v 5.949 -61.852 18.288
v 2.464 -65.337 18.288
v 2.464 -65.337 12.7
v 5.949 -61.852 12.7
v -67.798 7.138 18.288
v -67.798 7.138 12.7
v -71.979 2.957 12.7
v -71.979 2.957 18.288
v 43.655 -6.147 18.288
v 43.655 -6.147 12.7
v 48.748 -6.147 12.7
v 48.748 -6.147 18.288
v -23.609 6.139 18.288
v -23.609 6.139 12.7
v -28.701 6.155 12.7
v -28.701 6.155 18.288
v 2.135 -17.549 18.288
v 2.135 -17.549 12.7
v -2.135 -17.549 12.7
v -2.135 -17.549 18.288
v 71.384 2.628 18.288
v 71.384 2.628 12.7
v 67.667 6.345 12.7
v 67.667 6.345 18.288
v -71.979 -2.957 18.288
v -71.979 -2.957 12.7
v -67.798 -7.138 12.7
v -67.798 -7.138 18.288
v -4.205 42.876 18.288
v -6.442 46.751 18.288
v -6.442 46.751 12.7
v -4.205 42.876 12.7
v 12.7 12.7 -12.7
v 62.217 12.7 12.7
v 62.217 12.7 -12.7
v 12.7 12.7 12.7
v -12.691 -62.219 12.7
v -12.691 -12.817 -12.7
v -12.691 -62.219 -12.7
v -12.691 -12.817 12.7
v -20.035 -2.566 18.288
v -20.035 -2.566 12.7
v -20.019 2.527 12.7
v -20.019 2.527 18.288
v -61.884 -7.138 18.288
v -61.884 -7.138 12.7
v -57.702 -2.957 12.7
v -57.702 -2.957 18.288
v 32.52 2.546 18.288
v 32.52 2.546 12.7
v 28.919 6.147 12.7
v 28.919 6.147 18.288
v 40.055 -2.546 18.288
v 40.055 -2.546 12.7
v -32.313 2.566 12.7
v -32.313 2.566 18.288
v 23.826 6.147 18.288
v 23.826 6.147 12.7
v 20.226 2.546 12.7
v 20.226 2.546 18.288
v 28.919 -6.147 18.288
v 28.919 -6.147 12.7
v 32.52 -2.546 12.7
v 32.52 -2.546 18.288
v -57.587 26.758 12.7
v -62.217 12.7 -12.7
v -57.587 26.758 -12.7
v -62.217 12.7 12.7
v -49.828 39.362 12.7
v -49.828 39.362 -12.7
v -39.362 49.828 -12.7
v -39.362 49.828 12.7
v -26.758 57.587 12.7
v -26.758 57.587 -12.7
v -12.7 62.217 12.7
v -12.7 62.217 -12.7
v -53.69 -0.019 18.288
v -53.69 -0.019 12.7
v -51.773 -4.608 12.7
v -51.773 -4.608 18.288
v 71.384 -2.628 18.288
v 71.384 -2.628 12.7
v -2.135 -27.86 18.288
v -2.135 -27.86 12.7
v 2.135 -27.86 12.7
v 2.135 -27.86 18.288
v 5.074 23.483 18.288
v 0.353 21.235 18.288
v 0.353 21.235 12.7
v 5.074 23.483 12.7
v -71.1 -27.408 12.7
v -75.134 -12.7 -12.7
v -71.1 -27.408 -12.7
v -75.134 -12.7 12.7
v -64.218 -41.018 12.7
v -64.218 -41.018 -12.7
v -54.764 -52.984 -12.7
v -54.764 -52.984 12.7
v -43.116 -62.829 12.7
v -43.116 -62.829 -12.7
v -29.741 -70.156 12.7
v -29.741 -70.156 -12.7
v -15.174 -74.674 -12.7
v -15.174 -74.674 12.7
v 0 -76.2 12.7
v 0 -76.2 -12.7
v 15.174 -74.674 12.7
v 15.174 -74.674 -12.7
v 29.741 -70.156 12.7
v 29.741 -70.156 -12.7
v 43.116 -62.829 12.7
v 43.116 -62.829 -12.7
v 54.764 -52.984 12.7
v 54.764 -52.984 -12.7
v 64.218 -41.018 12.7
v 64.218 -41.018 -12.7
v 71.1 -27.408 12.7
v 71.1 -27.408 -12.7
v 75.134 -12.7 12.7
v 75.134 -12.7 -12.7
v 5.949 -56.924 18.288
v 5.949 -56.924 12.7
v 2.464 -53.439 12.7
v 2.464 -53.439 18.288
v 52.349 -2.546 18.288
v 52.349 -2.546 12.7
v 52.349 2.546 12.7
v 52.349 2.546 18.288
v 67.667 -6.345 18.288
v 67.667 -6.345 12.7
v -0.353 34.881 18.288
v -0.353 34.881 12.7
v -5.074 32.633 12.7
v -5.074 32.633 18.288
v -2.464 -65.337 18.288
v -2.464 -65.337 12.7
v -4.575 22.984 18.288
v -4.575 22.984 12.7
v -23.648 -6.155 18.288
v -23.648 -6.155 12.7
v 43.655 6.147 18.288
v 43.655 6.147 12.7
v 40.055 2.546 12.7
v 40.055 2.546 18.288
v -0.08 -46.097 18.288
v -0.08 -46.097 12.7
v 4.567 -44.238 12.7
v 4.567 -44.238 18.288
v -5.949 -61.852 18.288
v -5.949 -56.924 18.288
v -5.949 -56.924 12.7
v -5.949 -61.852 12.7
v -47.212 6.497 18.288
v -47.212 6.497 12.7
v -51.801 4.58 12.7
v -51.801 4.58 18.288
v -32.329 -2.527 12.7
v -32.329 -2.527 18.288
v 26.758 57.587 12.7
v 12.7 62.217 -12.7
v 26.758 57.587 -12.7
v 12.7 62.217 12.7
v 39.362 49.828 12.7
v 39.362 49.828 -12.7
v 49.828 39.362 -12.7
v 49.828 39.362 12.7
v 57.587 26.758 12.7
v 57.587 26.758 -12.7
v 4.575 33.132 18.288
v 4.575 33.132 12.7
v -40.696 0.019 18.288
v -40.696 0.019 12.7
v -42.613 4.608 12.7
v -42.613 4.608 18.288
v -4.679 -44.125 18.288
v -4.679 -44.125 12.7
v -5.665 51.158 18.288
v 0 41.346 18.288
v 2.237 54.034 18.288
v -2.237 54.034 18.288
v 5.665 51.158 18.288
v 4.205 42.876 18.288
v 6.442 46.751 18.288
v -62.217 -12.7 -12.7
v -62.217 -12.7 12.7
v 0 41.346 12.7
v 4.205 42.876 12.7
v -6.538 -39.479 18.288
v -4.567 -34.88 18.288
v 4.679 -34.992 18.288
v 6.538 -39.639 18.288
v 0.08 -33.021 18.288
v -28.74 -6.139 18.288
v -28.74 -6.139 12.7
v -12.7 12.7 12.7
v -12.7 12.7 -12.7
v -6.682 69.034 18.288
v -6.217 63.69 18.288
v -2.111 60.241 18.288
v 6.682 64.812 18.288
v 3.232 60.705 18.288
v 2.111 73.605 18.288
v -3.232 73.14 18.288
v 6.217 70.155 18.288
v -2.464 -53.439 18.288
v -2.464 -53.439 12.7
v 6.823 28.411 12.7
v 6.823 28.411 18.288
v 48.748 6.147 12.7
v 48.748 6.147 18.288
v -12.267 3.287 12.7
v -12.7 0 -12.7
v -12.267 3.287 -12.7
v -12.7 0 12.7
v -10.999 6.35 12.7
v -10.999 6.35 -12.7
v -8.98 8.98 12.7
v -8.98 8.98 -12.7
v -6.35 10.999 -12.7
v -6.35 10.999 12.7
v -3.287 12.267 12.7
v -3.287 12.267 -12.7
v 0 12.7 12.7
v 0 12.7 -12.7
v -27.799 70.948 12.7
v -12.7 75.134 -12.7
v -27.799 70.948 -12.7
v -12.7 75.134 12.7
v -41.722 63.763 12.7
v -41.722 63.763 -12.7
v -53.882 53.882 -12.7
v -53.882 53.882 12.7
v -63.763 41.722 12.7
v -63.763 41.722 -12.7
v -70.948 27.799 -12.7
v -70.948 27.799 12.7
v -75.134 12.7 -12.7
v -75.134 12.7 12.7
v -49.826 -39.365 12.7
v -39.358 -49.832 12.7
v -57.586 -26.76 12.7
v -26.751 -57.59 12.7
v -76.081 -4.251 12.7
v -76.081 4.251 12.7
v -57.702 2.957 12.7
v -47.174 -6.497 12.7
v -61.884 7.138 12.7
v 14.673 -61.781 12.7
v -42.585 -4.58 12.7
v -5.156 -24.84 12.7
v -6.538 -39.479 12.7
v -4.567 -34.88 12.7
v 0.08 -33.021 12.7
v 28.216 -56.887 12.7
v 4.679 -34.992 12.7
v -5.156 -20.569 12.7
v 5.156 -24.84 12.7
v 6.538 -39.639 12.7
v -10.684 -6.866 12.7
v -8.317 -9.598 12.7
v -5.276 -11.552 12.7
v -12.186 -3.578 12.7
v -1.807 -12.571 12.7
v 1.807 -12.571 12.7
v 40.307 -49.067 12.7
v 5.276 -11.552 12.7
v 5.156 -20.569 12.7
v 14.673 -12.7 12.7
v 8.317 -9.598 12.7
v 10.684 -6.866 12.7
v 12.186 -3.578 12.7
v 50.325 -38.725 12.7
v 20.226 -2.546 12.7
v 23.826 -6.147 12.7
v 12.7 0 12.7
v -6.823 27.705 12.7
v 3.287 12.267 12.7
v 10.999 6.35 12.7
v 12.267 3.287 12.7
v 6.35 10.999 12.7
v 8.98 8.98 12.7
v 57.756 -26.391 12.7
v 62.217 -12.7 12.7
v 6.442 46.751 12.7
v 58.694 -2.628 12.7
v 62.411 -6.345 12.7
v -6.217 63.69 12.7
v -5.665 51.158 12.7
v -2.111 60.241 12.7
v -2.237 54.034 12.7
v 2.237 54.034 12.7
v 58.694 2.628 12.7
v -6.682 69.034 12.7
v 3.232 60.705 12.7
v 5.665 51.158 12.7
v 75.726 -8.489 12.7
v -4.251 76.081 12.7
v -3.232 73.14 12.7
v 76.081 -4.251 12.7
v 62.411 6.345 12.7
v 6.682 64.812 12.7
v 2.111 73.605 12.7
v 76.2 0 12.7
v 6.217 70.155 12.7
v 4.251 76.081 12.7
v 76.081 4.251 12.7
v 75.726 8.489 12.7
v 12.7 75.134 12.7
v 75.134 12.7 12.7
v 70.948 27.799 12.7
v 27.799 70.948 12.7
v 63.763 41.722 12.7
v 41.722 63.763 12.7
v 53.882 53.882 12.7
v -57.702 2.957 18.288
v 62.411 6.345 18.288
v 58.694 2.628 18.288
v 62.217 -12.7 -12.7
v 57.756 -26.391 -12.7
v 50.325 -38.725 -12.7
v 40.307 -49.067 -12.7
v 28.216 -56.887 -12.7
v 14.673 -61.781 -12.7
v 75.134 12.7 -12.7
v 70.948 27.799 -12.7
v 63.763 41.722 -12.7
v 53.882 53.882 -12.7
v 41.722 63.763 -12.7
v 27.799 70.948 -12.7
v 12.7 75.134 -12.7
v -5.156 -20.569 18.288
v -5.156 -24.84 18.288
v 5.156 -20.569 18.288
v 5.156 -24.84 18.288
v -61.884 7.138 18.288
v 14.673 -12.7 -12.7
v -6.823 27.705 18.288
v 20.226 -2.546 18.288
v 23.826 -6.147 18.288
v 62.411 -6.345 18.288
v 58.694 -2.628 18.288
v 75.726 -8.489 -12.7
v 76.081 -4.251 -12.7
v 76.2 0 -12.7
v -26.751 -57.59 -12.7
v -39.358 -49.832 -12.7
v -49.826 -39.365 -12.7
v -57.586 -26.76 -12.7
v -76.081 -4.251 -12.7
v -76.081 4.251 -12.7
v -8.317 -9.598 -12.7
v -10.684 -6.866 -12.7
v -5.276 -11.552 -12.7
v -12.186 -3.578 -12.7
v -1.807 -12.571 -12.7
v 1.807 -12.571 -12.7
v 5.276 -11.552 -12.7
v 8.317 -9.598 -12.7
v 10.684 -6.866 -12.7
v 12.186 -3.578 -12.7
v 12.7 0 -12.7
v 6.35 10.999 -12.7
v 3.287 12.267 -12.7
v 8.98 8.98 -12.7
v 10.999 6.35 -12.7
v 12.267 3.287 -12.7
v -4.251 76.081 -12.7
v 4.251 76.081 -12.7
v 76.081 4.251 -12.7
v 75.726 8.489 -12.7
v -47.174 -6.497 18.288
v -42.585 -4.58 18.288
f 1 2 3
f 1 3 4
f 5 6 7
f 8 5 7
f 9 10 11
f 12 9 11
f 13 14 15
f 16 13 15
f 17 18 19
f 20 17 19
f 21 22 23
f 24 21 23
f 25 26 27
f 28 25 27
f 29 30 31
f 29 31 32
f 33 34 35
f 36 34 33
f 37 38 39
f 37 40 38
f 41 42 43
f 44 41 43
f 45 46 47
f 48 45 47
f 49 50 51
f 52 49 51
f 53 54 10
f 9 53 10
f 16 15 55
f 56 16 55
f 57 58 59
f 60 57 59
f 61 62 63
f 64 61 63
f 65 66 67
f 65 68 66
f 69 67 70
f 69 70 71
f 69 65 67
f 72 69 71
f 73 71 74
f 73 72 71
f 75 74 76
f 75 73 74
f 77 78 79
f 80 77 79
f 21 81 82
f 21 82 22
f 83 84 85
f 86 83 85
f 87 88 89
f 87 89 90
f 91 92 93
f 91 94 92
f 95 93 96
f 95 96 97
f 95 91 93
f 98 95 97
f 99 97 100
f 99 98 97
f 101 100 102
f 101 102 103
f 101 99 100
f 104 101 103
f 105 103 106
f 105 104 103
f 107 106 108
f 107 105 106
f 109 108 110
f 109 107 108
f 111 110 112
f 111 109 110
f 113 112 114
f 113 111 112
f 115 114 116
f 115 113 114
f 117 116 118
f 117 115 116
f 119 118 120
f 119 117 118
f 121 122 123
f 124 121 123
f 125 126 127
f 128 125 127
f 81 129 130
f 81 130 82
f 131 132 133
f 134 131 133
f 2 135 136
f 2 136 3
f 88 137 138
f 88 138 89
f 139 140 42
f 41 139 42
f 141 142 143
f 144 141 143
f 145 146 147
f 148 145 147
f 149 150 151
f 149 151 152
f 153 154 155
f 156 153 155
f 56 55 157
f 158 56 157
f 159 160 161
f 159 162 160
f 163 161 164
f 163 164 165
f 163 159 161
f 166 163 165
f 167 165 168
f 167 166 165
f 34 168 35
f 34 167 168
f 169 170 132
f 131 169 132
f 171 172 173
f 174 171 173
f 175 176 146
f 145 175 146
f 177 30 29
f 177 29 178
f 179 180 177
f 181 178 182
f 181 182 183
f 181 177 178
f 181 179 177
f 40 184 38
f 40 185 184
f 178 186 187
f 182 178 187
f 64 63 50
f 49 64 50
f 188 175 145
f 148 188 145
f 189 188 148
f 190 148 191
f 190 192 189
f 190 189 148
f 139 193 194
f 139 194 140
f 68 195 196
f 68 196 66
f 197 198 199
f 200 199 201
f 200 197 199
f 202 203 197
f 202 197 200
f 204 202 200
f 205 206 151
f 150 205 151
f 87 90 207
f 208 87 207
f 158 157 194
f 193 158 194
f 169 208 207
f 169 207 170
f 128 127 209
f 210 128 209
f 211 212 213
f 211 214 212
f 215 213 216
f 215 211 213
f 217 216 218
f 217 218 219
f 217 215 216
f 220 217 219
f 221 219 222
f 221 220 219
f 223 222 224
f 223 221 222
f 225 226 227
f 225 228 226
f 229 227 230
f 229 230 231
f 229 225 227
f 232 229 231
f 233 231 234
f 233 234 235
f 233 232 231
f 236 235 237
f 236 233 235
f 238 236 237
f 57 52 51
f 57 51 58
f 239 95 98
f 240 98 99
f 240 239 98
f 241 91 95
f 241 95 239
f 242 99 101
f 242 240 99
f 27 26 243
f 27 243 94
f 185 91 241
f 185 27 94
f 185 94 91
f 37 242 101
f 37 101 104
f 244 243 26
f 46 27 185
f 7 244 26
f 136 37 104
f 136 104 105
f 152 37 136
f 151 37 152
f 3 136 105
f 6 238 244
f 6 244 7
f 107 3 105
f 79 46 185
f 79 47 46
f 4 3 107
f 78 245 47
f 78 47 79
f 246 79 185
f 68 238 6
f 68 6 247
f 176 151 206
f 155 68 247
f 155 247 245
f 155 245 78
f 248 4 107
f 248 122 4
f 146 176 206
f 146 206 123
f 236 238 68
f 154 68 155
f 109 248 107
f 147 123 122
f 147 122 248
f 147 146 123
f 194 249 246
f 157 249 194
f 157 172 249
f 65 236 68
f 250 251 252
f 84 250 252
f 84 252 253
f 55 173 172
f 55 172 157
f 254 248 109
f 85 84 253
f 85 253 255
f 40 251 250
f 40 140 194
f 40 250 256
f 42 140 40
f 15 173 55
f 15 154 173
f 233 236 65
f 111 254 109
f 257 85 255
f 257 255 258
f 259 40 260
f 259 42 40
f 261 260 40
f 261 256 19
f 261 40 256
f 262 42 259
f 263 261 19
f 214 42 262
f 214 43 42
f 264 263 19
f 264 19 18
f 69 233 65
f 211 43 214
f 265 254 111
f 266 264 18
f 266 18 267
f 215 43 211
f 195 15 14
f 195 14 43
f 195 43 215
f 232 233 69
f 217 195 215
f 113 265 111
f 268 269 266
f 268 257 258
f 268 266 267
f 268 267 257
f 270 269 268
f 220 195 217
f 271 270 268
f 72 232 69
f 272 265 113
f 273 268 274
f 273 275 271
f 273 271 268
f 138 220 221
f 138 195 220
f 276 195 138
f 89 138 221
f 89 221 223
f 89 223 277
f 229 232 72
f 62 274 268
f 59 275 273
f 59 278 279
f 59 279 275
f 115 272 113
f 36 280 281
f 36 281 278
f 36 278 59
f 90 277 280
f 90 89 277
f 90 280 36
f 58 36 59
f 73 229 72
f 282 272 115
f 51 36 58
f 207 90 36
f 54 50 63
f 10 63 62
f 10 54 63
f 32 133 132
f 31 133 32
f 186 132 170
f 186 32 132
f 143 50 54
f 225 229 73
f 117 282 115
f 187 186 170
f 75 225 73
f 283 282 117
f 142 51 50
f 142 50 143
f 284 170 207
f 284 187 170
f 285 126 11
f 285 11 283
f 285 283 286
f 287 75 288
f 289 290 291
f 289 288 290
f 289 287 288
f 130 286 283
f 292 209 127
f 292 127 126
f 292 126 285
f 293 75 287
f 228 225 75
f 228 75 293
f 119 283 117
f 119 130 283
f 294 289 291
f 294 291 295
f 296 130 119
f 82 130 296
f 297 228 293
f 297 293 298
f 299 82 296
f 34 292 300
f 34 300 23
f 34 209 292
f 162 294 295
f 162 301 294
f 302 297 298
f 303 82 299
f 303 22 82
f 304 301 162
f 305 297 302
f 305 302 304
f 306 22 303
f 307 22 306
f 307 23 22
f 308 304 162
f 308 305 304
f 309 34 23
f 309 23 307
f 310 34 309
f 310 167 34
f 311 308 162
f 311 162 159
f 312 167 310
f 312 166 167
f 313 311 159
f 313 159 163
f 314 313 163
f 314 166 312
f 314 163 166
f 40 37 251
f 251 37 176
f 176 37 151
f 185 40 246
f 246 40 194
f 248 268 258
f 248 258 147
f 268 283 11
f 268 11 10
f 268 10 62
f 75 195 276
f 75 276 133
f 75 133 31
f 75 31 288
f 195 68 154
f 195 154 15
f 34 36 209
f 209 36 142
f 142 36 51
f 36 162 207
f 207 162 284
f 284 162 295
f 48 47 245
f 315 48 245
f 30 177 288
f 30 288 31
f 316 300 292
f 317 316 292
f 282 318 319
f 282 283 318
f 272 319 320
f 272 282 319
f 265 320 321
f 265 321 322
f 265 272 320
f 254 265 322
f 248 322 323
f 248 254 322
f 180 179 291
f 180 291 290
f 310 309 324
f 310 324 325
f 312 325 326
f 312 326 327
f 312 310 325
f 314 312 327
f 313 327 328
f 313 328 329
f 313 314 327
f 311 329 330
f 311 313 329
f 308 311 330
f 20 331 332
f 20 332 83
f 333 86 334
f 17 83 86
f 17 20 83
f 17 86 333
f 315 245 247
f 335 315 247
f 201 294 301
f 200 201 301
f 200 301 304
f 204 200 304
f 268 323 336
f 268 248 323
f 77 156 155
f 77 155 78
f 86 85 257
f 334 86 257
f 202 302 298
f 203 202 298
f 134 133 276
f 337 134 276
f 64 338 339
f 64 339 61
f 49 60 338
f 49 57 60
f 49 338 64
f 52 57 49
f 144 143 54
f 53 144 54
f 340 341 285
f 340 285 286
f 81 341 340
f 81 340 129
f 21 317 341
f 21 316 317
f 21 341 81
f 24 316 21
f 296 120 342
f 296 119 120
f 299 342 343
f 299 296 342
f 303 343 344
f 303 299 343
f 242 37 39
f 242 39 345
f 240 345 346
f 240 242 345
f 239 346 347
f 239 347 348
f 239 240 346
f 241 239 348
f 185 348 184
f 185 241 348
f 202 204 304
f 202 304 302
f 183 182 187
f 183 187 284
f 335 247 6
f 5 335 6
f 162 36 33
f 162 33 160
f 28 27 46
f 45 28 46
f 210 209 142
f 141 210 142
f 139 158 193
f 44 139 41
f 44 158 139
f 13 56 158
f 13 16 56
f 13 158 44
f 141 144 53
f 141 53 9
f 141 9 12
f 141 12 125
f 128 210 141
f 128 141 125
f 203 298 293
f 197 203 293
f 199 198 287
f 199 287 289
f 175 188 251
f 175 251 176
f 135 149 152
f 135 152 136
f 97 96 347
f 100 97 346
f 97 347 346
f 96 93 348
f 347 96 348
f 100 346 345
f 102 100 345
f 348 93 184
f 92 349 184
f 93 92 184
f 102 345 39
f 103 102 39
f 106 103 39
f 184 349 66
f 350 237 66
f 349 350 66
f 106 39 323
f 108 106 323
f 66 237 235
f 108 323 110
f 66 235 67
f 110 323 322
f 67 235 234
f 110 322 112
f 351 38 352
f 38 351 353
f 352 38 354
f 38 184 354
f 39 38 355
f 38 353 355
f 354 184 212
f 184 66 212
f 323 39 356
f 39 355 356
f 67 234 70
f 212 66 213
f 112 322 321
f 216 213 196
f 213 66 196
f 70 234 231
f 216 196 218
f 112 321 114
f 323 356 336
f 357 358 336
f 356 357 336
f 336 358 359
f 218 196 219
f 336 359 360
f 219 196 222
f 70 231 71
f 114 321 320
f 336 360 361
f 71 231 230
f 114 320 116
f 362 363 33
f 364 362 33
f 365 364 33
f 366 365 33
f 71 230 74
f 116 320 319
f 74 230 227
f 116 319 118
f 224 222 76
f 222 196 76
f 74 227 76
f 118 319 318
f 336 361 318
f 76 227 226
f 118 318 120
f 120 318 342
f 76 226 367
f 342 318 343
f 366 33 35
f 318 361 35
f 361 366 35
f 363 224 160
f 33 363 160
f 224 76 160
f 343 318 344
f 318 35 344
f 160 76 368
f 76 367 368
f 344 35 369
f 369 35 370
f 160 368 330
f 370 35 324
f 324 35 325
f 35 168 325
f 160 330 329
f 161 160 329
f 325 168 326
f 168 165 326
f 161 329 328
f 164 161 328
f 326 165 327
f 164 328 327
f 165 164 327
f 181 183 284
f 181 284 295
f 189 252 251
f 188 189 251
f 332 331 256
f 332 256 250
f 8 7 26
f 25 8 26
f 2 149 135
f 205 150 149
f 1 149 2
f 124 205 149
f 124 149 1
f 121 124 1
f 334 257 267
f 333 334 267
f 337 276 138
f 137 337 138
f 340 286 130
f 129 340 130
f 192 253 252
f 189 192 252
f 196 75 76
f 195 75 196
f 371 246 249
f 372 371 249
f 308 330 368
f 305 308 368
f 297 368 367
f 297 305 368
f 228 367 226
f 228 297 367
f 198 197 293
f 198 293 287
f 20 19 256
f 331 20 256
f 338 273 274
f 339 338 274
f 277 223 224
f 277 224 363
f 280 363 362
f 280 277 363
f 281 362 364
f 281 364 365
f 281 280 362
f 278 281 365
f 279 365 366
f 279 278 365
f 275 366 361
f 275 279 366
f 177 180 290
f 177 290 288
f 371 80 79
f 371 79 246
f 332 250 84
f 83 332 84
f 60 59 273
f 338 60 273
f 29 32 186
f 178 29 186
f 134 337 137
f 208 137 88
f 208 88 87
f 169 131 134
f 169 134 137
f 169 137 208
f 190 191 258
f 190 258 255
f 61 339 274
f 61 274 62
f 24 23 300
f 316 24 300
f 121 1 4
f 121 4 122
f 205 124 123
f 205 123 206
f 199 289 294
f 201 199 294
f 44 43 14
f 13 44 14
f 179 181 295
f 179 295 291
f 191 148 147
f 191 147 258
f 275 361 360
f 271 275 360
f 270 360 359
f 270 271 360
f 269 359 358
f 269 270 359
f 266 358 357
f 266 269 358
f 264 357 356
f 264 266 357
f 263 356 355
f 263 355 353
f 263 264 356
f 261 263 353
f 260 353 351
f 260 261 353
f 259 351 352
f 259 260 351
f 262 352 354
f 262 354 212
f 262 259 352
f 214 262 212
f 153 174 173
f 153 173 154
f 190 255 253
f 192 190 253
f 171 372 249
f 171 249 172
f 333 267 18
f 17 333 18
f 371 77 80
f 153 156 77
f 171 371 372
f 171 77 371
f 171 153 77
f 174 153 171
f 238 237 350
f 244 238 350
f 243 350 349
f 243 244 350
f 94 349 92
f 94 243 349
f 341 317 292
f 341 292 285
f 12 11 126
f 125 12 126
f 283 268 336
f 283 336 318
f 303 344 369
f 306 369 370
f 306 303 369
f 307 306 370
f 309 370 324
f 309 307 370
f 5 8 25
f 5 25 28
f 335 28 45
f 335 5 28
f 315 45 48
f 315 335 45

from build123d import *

# Parameters (mm, degrees)
F1_DEPTH = 12.7
F3_DEPTH = 5.588


with BuildPart() as f1:
    # F0 (on Top) → F1 (new body, symmetric)
    with BuildSketch(Plane.XY):
        with BuildLine():
            ThreePointArc((75.134213, -12.7), (75.933086, -6.372321), (76.2, 0))
            ThreePointArc((76.2, 0), (75.933086, 6.372321), (75.134213, 12.7))
            ThreePointArc((75.134213, 12.7), (53.881537, 53.881537), (12.7, 75.134213))
            ThreePointArc((12.7, 75.134213), (0, 76.2), (-12.7, 75.134213))
            ThreePointArc((-12.7, 75.134213), (-53.881537, 53.881537), (-75.134213, 12.7))
            ThreePointArc((-75.134213, 12.7), (-76.2, 0), (-75.134213, -12.7))
            ThreePointArc((-75.134213, -12.7), (0, -76.2), (75.134213, -12.7))
        make_face()
        with BuildLine():
            ThreePointArc((-12.690558, -62.218966), (-44.897873, -44.904687), (-62.217039, -12.7))
            Line((-62.217039, -12.7), (-12.690558, -12.817428))
            Line((-12.690558, -12.817428), (-12.690558, -62.218966))
        make_face(mode=Mode.SUBTRACT)
        with BuildLine():
            Line((14.67346, -12.7), (62.217039, -12.7))
            ThreePointArc((62.217039, -12.7), (45.610118, -44.181073), (14.67346, -61.781385))
            Line((14.67346, -61.781385), (14.67346, -12.7))
        make_face(mode=Mode.SUBTRACT)
        with BuildLine():
            Line((-12.7, 12.7), (-62.217039, 12.7))
            ThreePointArc((-62.217039, 12.7), (-44.901281, 44.901281), (-12.7, 62.217039))
            Line((-12.7, 62.217039), (-12.7, 12.7))
        make_face(mode=Mode.SUBTRACT)
        with BuildLine():
            ThreePointArc((0, 12.7), (8.980256, 8.980256), (12.7, 0))
            ThreePointArc((12.7, 0), (0, -12.7), (-12.7, 0))
            ThreePointArc((-12.7, 0), (-8.980256, 8.980256), (0, 12.7))
        make_face(mode=Mode.SUBTRACT)
        with BuildLine():
            Line((12.7, 12.7), (12.7, 62.217039))
            ThreePointArc((12.7, 62.217039), (44.901281, 44.901281), (62.217039, 12.7))
            Line((62.217039, 12.7), (12.7, 12.7))
        make_face(mode=Mode.SUBTRACT)
    extrude(amount=F1_DEPTH, both=True)

    # F2 (on face) → F3 (join)
    with BuildSketch(Plane.XY.offset(12.7)):
        Polygon((3.232429, 60.705414), (6.682069, 64.812133), (6.217445, 70.155287), (2.110725, 73.604928), (-3.232429, 73.140303), (-6.682069, 69.033583), (-6.217445, 63.69043), (-2.110725, 60.240789), align=None)
        Polygon((2.237321, 54.034017), (-2.237321, 54.034017), (-5.665096, 51.157772), (-6.44211, 46.751109), (-4.204789, 42.875955), (0, 41.345537), (4.204789, 42.875955), (6.44211, 46.751109), (5.665096, 51.157772), align=None)
        Polygon((4.574757, 33.132439), (-0.353307, 34.881021), (-5.074409, 32.632787), (-6.822991, 27.704723), (-4.574757, 22.983621), (0.353307, 21.235039), (5.074409, 23.483272), (6.822991, 28.411337), align=None)
        Polygon((-57.702381, -2.95684), (-57.702381, 2.95684), (-61.883984, 7.138442), (-67.797663, 7.138442), (-71.979266, 2.95684), (-71.979266, -2.95684), (-67.797663, -7.138442), (-61.883984, -7.138442), align=None)
        Polygon((-51.800584, 4.580097), (-53.689675, -0.019427), (-51.77311, -4.607571), (-47.173586, -6.496662), (-42.585442, -4.580097), (-40.696351, 0.019427), (-42.612916, 4.607571), (-47.21244, 6.496662), align=None)
        Polygon((-32.313216, 2.565593), (-32.32931, -2.526738), (-28.739868, -6.138941), (-23.647537, -6.155035), (-20.035334, -2.565593), (-20.01924, 2.526738), (-23.608682, 6.138941), (-28.701014, 6.155035), align=None)
        Polygon((-5.155539, -20.568707), (-5.155539, -24.839695), (-2.135494, -27.85974), (2.135494, -27.85974), (5.155539, -24.839695), (5.155539, -20.568707), (2.135494, -17.548662), (-2.135494, -17.548662), align=None)
        Polygon((-4.566506, -34.879606), (-6.537733, -39.479133), (-4.679244, -44.125357), (-0.079718, -46.096583), (4.566506, -44.238094), (6.537733, -39.638568), (4.679244, -34.992344), (0.079718, -33.021117), align=None)
        Polygon((-5.948699, -56.923812), (-5.948699, -61.851876), (-2.464032, -65.336543), (2.464032, -65.336543), (5.948699, -61.851876), (5.948699, -56.923812), (2.464032, -53.439145), (-2.464032, -53.439145), align=None)
        Polygon((20.225577, 2.546165), (20.225577, -2.546165), (23.826398, -6.146986), (28.918728, -6.146986), (32.519549, -2.546165), (32.519549, 2.546165), (28.918728, 6.146986), (23.826398, 6.146986), align=None)
        Polygon((40.054575, 2.546165), (40.054575, -2.546165), (43.655396, -6.146986), (48.747726, -6.146986), (52.348547, -2.546165), (52.348547, 2.546165), (48.747726, 6.146986), (43.655396, 6.146986), align=None)
        Polygon((58.693826, 2.628301), (58.693826, -2.628301), (62.410805, -6.34528), (67.667407, -6.34528), (71.384385, -2.628301), (71.384385, 2.628301), (67.667407, 6.34528), (62.410805, 6.34528), align=None)
    extrude(amount=F3_DEPTH)


solid = f1.part
